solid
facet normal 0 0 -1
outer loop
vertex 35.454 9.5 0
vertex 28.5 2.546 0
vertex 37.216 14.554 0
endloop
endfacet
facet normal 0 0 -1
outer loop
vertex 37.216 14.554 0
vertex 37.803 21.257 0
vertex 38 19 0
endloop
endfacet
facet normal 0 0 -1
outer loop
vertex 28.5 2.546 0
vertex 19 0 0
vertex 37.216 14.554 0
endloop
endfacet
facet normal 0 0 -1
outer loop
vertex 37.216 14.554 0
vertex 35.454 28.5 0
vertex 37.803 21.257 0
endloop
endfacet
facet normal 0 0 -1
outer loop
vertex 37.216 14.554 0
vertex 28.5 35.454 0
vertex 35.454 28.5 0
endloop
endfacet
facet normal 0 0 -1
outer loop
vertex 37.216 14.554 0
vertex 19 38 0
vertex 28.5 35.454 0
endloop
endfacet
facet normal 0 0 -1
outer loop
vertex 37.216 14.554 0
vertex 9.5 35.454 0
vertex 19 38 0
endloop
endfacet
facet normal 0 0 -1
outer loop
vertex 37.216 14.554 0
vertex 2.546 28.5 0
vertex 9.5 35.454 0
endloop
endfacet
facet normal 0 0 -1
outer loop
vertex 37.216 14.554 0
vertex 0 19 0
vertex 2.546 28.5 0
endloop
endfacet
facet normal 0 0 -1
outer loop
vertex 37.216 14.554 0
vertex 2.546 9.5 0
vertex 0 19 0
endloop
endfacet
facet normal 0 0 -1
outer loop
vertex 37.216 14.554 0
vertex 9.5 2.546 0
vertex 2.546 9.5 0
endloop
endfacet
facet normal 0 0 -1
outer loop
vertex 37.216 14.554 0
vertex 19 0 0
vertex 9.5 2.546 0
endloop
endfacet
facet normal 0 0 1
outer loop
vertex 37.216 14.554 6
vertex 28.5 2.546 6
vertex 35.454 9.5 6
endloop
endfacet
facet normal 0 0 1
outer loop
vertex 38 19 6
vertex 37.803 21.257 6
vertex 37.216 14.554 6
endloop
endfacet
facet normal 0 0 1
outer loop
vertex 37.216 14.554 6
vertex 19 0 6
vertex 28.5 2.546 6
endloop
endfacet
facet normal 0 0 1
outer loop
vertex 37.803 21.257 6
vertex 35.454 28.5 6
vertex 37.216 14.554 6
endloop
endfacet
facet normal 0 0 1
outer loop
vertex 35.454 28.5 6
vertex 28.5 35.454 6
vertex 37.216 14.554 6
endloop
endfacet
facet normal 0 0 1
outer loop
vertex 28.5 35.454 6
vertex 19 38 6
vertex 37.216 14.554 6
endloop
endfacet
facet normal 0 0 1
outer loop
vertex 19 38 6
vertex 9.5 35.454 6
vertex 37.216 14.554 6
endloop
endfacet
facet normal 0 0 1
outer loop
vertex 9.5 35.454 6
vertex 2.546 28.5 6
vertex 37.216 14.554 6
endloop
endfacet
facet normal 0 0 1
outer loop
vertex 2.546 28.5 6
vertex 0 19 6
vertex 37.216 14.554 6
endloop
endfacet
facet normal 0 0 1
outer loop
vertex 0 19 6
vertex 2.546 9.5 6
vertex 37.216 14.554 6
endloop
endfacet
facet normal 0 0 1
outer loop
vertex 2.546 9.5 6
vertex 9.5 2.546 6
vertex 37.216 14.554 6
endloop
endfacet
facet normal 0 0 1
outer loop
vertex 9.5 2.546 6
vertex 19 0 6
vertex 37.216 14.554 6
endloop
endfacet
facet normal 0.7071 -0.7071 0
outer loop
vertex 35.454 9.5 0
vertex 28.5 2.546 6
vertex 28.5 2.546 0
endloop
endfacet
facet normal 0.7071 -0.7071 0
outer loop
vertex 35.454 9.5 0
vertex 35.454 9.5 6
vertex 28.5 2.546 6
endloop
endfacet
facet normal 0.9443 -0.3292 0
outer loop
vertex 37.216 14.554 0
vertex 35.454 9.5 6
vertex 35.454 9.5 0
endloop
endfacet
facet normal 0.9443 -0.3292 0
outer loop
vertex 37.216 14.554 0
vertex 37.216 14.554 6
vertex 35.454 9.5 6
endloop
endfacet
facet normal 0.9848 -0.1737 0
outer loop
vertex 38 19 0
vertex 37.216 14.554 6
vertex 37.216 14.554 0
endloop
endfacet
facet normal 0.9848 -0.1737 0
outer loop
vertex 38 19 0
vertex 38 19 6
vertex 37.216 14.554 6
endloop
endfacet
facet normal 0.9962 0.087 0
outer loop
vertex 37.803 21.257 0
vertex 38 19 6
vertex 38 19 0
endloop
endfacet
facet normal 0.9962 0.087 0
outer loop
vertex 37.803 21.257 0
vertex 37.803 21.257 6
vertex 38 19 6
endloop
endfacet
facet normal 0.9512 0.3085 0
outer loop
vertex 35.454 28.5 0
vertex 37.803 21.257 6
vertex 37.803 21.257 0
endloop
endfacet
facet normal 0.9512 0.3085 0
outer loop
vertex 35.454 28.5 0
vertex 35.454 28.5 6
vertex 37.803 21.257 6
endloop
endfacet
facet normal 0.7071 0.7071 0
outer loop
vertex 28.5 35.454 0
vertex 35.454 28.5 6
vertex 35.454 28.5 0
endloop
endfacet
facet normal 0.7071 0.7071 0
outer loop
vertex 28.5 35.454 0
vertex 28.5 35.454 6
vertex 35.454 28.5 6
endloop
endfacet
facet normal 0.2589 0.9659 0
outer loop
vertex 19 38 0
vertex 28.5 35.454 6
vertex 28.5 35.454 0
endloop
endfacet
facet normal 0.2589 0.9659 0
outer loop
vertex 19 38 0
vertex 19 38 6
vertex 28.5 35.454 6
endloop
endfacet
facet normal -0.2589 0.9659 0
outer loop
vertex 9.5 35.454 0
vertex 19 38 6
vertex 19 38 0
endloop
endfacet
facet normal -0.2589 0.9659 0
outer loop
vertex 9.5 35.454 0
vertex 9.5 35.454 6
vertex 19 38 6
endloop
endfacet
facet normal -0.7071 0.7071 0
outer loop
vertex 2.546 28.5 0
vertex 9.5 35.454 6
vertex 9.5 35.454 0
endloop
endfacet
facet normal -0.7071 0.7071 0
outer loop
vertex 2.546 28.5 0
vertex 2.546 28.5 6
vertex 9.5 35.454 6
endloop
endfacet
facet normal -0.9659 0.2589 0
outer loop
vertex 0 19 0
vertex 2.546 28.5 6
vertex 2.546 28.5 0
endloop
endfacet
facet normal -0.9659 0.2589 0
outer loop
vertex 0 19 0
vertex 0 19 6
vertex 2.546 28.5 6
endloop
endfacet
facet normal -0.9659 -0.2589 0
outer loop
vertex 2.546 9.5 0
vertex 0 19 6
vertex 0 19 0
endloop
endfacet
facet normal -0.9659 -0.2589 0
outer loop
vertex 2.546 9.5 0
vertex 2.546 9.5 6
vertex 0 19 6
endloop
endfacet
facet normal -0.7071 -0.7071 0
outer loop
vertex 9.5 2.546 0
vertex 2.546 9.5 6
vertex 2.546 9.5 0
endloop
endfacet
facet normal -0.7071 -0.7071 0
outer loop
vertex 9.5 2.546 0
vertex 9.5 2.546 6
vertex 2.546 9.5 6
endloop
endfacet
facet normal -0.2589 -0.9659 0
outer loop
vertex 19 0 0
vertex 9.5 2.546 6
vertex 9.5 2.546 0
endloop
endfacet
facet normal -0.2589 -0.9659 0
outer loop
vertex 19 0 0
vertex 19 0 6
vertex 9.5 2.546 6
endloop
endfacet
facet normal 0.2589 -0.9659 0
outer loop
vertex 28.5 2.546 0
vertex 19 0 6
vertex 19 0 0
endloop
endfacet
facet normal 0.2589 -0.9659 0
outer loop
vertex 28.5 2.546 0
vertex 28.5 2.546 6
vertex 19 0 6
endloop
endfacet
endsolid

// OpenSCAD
$fn = 32;

// ----------------------------------------------------------------------
// Eccentric disc: egg, 6 mm thick
// ----------------------------------------------------------------------

// --- parameters (mm) ---
profile_height = 6;       // extrusion height
profile_points = 14;      // points of the closed outline

profile = [[0, 19], [2.546, 9.5], [9.5, 2.546], [19, 0], [28.5, 2.546], [35.454, 9.5], [37.216, 14.554], [38, 19], [37.803, 21.257], [35.454, 28.5], [28.5, 35.454], [19, 38], [9.5, 35.454], [2.546, 28.5]];  // single closed polygon, 14 points, counter clockwise

// --- the one profile operation ---
linear_extrude(height = profile_height) polygon(points = profile);
